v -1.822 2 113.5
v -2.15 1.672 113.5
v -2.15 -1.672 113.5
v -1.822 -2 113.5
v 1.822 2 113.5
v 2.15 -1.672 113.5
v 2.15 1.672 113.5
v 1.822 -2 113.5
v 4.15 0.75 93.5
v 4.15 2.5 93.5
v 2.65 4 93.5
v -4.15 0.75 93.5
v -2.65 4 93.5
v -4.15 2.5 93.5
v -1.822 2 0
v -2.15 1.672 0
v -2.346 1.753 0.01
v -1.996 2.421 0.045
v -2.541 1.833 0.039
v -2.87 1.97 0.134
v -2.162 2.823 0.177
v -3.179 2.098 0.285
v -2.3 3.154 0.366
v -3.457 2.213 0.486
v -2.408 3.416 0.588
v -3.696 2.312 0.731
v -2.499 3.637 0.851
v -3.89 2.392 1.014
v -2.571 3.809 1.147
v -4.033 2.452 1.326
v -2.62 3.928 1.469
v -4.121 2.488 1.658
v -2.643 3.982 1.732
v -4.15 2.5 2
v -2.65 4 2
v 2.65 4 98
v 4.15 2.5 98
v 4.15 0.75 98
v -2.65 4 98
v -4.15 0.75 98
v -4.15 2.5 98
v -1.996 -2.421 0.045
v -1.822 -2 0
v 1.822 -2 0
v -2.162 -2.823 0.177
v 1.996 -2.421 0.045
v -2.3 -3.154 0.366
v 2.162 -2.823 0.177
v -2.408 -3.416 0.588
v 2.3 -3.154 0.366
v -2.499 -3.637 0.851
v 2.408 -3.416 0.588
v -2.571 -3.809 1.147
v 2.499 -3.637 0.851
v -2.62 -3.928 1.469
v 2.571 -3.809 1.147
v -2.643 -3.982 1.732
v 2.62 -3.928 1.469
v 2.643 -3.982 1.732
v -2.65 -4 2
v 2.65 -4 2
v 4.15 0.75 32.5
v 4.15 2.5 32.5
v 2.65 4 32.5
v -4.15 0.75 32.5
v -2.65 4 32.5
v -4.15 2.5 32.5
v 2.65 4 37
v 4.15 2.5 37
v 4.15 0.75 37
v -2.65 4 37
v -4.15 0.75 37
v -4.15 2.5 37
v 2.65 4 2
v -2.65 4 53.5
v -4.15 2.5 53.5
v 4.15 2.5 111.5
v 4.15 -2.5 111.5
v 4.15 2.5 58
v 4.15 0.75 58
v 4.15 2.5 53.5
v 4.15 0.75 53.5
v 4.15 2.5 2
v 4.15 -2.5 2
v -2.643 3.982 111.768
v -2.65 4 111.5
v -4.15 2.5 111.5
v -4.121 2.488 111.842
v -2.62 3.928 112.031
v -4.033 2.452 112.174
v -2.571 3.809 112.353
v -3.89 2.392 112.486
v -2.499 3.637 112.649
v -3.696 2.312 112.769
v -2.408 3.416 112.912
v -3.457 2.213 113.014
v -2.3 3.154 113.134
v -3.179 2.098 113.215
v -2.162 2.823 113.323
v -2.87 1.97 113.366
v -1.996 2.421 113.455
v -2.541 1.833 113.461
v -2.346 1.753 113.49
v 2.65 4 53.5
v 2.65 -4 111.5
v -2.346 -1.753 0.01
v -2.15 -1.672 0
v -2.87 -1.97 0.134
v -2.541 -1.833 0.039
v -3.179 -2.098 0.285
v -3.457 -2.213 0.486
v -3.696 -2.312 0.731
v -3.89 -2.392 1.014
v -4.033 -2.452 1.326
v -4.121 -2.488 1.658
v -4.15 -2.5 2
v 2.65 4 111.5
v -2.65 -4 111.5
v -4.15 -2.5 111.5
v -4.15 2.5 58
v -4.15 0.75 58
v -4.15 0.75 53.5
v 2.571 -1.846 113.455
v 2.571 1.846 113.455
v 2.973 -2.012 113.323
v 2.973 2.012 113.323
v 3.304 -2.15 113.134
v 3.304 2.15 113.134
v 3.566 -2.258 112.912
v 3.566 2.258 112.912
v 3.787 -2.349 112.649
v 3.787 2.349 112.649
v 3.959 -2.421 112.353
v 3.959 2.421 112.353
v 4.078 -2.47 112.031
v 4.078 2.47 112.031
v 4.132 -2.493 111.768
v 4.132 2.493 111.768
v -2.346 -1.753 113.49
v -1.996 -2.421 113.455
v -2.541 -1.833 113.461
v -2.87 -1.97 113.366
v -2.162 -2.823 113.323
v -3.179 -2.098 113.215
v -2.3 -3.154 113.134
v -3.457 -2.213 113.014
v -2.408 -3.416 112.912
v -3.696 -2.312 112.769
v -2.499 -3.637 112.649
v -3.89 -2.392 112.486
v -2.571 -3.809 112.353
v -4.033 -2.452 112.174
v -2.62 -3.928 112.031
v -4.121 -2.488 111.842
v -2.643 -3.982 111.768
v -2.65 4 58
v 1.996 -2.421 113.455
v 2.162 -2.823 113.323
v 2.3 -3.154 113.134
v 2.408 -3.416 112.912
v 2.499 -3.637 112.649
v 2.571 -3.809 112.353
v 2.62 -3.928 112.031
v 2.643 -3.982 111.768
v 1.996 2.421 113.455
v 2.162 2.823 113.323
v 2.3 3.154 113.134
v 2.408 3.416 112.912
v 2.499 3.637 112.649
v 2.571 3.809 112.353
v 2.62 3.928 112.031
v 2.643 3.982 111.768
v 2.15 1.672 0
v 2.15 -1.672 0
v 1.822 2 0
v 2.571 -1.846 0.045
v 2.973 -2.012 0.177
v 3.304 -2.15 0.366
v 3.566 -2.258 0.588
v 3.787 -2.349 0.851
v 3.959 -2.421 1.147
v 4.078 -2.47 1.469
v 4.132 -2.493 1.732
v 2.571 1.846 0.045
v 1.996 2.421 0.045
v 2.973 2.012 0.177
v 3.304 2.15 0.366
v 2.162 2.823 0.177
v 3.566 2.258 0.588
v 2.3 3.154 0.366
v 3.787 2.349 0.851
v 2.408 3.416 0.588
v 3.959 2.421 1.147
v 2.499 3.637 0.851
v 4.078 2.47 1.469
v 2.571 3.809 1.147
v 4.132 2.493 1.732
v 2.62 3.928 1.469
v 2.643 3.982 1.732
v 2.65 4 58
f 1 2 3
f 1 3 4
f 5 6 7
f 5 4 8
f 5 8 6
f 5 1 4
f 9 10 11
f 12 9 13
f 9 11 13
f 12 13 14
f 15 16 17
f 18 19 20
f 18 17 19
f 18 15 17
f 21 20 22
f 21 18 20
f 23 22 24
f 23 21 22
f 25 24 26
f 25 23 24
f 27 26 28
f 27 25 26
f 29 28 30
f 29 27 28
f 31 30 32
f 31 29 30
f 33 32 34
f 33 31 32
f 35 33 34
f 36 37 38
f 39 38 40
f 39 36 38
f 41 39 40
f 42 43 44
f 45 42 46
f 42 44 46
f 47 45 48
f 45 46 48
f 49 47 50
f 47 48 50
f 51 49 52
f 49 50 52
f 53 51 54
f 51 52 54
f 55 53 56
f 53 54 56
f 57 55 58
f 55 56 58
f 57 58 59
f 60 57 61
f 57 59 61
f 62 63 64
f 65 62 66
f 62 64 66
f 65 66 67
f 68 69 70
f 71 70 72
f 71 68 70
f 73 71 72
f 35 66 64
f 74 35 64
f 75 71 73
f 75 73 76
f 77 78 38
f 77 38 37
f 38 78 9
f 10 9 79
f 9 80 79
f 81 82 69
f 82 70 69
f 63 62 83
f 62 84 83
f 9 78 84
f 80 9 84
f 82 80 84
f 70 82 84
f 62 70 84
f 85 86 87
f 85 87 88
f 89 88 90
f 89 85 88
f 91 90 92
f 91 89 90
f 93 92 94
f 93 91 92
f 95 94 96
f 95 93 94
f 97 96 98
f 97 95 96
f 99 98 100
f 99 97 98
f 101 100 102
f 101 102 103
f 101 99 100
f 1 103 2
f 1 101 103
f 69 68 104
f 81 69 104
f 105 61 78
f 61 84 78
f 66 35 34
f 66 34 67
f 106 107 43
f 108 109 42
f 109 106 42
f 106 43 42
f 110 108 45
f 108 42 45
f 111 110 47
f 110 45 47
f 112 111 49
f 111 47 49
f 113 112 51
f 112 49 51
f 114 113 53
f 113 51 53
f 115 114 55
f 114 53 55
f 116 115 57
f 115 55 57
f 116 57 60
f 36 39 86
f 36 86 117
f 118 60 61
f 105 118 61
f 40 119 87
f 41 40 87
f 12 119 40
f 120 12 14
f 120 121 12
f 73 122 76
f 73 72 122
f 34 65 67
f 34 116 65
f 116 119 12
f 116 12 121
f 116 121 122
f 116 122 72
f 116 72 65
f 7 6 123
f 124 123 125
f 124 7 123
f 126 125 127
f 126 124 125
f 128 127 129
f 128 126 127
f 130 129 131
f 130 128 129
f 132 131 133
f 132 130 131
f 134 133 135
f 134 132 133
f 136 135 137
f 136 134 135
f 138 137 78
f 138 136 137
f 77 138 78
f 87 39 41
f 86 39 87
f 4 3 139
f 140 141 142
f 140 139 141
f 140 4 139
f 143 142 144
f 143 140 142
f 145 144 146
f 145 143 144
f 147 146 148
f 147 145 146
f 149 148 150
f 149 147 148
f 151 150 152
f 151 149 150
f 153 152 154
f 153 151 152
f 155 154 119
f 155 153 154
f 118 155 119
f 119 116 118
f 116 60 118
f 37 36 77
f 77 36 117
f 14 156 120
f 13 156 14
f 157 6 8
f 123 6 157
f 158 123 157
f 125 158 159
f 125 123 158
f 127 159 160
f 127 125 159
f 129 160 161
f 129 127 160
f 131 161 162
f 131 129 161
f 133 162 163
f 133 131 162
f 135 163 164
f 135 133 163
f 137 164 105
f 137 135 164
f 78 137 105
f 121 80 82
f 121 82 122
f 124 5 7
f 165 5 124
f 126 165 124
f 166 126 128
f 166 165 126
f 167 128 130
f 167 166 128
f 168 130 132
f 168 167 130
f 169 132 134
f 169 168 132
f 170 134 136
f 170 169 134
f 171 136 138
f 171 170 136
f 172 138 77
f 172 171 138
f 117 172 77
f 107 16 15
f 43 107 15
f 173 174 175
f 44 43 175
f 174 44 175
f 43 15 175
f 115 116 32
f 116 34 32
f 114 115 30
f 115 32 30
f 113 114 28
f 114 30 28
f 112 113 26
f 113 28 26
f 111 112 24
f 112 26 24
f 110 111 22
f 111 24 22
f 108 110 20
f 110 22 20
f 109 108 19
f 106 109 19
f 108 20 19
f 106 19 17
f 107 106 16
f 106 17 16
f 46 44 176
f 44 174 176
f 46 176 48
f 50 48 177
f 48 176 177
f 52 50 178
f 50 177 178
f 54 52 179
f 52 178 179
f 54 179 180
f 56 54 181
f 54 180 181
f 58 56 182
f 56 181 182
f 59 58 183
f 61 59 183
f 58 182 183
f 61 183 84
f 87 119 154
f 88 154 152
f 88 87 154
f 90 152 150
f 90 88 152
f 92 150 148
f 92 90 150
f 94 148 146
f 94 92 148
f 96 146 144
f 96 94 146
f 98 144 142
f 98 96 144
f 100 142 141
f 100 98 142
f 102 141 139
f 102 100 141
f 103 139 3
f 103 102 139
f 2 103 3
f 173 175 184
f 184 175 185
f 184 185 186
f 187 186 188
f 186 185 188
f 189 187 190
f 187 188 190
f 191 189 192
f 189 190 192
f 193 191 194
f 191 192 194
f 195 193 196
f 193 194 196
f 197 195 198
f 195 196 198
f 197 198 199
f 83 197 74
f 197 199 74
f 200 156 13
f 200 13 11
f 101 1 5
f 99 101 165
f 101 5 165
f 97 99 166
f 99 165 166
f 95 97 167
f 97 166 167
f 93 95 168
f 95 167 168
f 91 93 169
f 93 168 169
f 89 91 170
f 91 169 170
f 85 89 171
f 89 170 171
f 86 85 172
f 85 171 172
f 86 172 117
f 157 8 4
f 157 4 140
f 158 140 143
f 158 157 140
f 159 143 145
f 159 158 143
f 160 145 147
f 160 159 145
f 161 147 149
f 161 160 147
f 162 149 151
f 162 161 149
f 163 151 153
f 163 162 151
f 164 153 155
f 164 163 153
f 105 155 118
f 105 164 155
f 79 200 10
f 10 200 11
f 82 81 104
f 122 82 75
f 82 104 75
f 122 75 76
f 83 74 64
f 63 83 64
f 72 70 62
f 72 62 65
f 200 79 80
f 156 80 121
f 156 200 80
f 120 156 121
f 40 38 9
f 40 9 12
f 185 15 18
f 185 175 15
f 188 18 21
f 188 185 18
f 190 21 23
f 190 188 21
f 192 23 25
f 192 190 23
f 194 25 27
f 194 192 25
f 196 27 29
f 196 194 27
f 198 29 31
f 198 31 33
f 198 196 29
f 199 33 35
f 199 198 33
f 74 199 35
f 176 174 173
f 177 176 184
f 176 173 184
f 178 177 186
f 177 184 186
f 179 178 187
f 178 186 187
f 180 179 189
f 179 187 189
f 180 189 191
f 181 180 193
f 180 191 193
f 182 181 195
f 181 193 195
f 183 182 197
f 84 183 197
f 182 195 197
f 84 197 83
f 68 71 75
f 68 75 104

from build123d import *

# Parameters (mm, degrees)
SKETCH1_W           = 8.3
SKETCH1_H           = 8
BOSS_EXTRUDE1_DEPTH = 113.5
CHAMFER2_SIZE       = 1.5
SKETCH3_W           = 8.3
SKETCH3_H           = 3.25
CUT_EXTRUDE1_DEPTH  = 4.5
SKETCH4_W           = 8.3
SKETCH4_H           = 3.25
CUT_EXTRUDE2_DEPTH  = 4.5
FILLET1_R           = 2
SKETCH6_W           = 8.3
SKETCH6_H           = 3.25
CUT_EXTRUDE3_DEPTH  = 4.5


with BuildPart() as part:
    # Sketch1 → Boss-Extrude1 (new body)
    with BuildSketch(Plane.XY):
        Rectangle(SKETCH1_W, SKETCH1_H)
    extrude(amount=BOSS_EXTRUDE1_DEPTH)

    # Chamfer2
    chamfer2_edges = [part.edges().sort_by_distance(p)[0] for p in [
        (-4.15, 4, 56.75),
        (4.15, 4, 56.75),
        (4.15, -4, 56.75),
        (-4.15, -4, 56.75),
    ]]
    chamfer(chamfer2_edges, length=CHAMFER2_SIZE)

    # Sketch3 → Cut-Extrude1 (cut)
    with BuildSketch(Plane(origin=(0, 0, 58), x_dir=(-1, 0, 0), z_dir=(0, 0, -1))):
        with Locations((0, 2.375)):
            Rectangle(SKETCH3_W, SKETCH3_H)
    extrude(amount=CUT_EXTRUDE1_DEPTH, mode=Mode.SUBTRACT)

    # Sketch4 → Cut-Extrude2 (cut)
    with BuildSketch(Plane(origin=(0, 0, 98), x_dir=(-1, 0, 0), z_dir=(0, 0, -1))):
        with Locations((0, 2.375)):
            Rectangle(SKETCH4_W, SKETCH4_H)
    extrude(amount=CUT_EXTRUDE2_DEPTH, mode=Mode.SUBTRACT)

    # Fillet1
    fillet1_edges = [part.edges().sort_by_distance(p)[0] for p in [
        (4.15, 0, 0),
        (4.15, 0, 113.5),
        (-4.15, 0, 0),
        (0, 4, 0),
        (0, -4, 0),
        (-3.4, 3.25, 0),
        (3.4, 3.25, 0),
        (-3.4, -3.25, 0),
        (3.4, -3.25, 0),
        (0, -4, 113.5),
        (-4.15, 0, 113.5),
        (0, 4, 113.5),
        (-3.4, 3.25, 113.5),
        (3.4, 3.25, 113.5),
        (-3.4, -3.25, 113.5),
        (3.4, -3.25, 113.5),
    ]]
    fillet(fillet1_edges, radius=FILLET1_R)

    # Sketch6 → Cut-Extrude3 (cut)
    with BuildSketch(Plane(origin=(0, 0, 37), x_dir=(-1, 0, 0), z_dir=(0, 0, -1))):
        with Locations((0, 2.375)):
            Rectangle(SKETCH6_W, SKETCH6_H)
    extrude(amount=CUT_EXTRUDE3_DEPTH, mode=Mode.SUBTRACT)


solid = part.part
